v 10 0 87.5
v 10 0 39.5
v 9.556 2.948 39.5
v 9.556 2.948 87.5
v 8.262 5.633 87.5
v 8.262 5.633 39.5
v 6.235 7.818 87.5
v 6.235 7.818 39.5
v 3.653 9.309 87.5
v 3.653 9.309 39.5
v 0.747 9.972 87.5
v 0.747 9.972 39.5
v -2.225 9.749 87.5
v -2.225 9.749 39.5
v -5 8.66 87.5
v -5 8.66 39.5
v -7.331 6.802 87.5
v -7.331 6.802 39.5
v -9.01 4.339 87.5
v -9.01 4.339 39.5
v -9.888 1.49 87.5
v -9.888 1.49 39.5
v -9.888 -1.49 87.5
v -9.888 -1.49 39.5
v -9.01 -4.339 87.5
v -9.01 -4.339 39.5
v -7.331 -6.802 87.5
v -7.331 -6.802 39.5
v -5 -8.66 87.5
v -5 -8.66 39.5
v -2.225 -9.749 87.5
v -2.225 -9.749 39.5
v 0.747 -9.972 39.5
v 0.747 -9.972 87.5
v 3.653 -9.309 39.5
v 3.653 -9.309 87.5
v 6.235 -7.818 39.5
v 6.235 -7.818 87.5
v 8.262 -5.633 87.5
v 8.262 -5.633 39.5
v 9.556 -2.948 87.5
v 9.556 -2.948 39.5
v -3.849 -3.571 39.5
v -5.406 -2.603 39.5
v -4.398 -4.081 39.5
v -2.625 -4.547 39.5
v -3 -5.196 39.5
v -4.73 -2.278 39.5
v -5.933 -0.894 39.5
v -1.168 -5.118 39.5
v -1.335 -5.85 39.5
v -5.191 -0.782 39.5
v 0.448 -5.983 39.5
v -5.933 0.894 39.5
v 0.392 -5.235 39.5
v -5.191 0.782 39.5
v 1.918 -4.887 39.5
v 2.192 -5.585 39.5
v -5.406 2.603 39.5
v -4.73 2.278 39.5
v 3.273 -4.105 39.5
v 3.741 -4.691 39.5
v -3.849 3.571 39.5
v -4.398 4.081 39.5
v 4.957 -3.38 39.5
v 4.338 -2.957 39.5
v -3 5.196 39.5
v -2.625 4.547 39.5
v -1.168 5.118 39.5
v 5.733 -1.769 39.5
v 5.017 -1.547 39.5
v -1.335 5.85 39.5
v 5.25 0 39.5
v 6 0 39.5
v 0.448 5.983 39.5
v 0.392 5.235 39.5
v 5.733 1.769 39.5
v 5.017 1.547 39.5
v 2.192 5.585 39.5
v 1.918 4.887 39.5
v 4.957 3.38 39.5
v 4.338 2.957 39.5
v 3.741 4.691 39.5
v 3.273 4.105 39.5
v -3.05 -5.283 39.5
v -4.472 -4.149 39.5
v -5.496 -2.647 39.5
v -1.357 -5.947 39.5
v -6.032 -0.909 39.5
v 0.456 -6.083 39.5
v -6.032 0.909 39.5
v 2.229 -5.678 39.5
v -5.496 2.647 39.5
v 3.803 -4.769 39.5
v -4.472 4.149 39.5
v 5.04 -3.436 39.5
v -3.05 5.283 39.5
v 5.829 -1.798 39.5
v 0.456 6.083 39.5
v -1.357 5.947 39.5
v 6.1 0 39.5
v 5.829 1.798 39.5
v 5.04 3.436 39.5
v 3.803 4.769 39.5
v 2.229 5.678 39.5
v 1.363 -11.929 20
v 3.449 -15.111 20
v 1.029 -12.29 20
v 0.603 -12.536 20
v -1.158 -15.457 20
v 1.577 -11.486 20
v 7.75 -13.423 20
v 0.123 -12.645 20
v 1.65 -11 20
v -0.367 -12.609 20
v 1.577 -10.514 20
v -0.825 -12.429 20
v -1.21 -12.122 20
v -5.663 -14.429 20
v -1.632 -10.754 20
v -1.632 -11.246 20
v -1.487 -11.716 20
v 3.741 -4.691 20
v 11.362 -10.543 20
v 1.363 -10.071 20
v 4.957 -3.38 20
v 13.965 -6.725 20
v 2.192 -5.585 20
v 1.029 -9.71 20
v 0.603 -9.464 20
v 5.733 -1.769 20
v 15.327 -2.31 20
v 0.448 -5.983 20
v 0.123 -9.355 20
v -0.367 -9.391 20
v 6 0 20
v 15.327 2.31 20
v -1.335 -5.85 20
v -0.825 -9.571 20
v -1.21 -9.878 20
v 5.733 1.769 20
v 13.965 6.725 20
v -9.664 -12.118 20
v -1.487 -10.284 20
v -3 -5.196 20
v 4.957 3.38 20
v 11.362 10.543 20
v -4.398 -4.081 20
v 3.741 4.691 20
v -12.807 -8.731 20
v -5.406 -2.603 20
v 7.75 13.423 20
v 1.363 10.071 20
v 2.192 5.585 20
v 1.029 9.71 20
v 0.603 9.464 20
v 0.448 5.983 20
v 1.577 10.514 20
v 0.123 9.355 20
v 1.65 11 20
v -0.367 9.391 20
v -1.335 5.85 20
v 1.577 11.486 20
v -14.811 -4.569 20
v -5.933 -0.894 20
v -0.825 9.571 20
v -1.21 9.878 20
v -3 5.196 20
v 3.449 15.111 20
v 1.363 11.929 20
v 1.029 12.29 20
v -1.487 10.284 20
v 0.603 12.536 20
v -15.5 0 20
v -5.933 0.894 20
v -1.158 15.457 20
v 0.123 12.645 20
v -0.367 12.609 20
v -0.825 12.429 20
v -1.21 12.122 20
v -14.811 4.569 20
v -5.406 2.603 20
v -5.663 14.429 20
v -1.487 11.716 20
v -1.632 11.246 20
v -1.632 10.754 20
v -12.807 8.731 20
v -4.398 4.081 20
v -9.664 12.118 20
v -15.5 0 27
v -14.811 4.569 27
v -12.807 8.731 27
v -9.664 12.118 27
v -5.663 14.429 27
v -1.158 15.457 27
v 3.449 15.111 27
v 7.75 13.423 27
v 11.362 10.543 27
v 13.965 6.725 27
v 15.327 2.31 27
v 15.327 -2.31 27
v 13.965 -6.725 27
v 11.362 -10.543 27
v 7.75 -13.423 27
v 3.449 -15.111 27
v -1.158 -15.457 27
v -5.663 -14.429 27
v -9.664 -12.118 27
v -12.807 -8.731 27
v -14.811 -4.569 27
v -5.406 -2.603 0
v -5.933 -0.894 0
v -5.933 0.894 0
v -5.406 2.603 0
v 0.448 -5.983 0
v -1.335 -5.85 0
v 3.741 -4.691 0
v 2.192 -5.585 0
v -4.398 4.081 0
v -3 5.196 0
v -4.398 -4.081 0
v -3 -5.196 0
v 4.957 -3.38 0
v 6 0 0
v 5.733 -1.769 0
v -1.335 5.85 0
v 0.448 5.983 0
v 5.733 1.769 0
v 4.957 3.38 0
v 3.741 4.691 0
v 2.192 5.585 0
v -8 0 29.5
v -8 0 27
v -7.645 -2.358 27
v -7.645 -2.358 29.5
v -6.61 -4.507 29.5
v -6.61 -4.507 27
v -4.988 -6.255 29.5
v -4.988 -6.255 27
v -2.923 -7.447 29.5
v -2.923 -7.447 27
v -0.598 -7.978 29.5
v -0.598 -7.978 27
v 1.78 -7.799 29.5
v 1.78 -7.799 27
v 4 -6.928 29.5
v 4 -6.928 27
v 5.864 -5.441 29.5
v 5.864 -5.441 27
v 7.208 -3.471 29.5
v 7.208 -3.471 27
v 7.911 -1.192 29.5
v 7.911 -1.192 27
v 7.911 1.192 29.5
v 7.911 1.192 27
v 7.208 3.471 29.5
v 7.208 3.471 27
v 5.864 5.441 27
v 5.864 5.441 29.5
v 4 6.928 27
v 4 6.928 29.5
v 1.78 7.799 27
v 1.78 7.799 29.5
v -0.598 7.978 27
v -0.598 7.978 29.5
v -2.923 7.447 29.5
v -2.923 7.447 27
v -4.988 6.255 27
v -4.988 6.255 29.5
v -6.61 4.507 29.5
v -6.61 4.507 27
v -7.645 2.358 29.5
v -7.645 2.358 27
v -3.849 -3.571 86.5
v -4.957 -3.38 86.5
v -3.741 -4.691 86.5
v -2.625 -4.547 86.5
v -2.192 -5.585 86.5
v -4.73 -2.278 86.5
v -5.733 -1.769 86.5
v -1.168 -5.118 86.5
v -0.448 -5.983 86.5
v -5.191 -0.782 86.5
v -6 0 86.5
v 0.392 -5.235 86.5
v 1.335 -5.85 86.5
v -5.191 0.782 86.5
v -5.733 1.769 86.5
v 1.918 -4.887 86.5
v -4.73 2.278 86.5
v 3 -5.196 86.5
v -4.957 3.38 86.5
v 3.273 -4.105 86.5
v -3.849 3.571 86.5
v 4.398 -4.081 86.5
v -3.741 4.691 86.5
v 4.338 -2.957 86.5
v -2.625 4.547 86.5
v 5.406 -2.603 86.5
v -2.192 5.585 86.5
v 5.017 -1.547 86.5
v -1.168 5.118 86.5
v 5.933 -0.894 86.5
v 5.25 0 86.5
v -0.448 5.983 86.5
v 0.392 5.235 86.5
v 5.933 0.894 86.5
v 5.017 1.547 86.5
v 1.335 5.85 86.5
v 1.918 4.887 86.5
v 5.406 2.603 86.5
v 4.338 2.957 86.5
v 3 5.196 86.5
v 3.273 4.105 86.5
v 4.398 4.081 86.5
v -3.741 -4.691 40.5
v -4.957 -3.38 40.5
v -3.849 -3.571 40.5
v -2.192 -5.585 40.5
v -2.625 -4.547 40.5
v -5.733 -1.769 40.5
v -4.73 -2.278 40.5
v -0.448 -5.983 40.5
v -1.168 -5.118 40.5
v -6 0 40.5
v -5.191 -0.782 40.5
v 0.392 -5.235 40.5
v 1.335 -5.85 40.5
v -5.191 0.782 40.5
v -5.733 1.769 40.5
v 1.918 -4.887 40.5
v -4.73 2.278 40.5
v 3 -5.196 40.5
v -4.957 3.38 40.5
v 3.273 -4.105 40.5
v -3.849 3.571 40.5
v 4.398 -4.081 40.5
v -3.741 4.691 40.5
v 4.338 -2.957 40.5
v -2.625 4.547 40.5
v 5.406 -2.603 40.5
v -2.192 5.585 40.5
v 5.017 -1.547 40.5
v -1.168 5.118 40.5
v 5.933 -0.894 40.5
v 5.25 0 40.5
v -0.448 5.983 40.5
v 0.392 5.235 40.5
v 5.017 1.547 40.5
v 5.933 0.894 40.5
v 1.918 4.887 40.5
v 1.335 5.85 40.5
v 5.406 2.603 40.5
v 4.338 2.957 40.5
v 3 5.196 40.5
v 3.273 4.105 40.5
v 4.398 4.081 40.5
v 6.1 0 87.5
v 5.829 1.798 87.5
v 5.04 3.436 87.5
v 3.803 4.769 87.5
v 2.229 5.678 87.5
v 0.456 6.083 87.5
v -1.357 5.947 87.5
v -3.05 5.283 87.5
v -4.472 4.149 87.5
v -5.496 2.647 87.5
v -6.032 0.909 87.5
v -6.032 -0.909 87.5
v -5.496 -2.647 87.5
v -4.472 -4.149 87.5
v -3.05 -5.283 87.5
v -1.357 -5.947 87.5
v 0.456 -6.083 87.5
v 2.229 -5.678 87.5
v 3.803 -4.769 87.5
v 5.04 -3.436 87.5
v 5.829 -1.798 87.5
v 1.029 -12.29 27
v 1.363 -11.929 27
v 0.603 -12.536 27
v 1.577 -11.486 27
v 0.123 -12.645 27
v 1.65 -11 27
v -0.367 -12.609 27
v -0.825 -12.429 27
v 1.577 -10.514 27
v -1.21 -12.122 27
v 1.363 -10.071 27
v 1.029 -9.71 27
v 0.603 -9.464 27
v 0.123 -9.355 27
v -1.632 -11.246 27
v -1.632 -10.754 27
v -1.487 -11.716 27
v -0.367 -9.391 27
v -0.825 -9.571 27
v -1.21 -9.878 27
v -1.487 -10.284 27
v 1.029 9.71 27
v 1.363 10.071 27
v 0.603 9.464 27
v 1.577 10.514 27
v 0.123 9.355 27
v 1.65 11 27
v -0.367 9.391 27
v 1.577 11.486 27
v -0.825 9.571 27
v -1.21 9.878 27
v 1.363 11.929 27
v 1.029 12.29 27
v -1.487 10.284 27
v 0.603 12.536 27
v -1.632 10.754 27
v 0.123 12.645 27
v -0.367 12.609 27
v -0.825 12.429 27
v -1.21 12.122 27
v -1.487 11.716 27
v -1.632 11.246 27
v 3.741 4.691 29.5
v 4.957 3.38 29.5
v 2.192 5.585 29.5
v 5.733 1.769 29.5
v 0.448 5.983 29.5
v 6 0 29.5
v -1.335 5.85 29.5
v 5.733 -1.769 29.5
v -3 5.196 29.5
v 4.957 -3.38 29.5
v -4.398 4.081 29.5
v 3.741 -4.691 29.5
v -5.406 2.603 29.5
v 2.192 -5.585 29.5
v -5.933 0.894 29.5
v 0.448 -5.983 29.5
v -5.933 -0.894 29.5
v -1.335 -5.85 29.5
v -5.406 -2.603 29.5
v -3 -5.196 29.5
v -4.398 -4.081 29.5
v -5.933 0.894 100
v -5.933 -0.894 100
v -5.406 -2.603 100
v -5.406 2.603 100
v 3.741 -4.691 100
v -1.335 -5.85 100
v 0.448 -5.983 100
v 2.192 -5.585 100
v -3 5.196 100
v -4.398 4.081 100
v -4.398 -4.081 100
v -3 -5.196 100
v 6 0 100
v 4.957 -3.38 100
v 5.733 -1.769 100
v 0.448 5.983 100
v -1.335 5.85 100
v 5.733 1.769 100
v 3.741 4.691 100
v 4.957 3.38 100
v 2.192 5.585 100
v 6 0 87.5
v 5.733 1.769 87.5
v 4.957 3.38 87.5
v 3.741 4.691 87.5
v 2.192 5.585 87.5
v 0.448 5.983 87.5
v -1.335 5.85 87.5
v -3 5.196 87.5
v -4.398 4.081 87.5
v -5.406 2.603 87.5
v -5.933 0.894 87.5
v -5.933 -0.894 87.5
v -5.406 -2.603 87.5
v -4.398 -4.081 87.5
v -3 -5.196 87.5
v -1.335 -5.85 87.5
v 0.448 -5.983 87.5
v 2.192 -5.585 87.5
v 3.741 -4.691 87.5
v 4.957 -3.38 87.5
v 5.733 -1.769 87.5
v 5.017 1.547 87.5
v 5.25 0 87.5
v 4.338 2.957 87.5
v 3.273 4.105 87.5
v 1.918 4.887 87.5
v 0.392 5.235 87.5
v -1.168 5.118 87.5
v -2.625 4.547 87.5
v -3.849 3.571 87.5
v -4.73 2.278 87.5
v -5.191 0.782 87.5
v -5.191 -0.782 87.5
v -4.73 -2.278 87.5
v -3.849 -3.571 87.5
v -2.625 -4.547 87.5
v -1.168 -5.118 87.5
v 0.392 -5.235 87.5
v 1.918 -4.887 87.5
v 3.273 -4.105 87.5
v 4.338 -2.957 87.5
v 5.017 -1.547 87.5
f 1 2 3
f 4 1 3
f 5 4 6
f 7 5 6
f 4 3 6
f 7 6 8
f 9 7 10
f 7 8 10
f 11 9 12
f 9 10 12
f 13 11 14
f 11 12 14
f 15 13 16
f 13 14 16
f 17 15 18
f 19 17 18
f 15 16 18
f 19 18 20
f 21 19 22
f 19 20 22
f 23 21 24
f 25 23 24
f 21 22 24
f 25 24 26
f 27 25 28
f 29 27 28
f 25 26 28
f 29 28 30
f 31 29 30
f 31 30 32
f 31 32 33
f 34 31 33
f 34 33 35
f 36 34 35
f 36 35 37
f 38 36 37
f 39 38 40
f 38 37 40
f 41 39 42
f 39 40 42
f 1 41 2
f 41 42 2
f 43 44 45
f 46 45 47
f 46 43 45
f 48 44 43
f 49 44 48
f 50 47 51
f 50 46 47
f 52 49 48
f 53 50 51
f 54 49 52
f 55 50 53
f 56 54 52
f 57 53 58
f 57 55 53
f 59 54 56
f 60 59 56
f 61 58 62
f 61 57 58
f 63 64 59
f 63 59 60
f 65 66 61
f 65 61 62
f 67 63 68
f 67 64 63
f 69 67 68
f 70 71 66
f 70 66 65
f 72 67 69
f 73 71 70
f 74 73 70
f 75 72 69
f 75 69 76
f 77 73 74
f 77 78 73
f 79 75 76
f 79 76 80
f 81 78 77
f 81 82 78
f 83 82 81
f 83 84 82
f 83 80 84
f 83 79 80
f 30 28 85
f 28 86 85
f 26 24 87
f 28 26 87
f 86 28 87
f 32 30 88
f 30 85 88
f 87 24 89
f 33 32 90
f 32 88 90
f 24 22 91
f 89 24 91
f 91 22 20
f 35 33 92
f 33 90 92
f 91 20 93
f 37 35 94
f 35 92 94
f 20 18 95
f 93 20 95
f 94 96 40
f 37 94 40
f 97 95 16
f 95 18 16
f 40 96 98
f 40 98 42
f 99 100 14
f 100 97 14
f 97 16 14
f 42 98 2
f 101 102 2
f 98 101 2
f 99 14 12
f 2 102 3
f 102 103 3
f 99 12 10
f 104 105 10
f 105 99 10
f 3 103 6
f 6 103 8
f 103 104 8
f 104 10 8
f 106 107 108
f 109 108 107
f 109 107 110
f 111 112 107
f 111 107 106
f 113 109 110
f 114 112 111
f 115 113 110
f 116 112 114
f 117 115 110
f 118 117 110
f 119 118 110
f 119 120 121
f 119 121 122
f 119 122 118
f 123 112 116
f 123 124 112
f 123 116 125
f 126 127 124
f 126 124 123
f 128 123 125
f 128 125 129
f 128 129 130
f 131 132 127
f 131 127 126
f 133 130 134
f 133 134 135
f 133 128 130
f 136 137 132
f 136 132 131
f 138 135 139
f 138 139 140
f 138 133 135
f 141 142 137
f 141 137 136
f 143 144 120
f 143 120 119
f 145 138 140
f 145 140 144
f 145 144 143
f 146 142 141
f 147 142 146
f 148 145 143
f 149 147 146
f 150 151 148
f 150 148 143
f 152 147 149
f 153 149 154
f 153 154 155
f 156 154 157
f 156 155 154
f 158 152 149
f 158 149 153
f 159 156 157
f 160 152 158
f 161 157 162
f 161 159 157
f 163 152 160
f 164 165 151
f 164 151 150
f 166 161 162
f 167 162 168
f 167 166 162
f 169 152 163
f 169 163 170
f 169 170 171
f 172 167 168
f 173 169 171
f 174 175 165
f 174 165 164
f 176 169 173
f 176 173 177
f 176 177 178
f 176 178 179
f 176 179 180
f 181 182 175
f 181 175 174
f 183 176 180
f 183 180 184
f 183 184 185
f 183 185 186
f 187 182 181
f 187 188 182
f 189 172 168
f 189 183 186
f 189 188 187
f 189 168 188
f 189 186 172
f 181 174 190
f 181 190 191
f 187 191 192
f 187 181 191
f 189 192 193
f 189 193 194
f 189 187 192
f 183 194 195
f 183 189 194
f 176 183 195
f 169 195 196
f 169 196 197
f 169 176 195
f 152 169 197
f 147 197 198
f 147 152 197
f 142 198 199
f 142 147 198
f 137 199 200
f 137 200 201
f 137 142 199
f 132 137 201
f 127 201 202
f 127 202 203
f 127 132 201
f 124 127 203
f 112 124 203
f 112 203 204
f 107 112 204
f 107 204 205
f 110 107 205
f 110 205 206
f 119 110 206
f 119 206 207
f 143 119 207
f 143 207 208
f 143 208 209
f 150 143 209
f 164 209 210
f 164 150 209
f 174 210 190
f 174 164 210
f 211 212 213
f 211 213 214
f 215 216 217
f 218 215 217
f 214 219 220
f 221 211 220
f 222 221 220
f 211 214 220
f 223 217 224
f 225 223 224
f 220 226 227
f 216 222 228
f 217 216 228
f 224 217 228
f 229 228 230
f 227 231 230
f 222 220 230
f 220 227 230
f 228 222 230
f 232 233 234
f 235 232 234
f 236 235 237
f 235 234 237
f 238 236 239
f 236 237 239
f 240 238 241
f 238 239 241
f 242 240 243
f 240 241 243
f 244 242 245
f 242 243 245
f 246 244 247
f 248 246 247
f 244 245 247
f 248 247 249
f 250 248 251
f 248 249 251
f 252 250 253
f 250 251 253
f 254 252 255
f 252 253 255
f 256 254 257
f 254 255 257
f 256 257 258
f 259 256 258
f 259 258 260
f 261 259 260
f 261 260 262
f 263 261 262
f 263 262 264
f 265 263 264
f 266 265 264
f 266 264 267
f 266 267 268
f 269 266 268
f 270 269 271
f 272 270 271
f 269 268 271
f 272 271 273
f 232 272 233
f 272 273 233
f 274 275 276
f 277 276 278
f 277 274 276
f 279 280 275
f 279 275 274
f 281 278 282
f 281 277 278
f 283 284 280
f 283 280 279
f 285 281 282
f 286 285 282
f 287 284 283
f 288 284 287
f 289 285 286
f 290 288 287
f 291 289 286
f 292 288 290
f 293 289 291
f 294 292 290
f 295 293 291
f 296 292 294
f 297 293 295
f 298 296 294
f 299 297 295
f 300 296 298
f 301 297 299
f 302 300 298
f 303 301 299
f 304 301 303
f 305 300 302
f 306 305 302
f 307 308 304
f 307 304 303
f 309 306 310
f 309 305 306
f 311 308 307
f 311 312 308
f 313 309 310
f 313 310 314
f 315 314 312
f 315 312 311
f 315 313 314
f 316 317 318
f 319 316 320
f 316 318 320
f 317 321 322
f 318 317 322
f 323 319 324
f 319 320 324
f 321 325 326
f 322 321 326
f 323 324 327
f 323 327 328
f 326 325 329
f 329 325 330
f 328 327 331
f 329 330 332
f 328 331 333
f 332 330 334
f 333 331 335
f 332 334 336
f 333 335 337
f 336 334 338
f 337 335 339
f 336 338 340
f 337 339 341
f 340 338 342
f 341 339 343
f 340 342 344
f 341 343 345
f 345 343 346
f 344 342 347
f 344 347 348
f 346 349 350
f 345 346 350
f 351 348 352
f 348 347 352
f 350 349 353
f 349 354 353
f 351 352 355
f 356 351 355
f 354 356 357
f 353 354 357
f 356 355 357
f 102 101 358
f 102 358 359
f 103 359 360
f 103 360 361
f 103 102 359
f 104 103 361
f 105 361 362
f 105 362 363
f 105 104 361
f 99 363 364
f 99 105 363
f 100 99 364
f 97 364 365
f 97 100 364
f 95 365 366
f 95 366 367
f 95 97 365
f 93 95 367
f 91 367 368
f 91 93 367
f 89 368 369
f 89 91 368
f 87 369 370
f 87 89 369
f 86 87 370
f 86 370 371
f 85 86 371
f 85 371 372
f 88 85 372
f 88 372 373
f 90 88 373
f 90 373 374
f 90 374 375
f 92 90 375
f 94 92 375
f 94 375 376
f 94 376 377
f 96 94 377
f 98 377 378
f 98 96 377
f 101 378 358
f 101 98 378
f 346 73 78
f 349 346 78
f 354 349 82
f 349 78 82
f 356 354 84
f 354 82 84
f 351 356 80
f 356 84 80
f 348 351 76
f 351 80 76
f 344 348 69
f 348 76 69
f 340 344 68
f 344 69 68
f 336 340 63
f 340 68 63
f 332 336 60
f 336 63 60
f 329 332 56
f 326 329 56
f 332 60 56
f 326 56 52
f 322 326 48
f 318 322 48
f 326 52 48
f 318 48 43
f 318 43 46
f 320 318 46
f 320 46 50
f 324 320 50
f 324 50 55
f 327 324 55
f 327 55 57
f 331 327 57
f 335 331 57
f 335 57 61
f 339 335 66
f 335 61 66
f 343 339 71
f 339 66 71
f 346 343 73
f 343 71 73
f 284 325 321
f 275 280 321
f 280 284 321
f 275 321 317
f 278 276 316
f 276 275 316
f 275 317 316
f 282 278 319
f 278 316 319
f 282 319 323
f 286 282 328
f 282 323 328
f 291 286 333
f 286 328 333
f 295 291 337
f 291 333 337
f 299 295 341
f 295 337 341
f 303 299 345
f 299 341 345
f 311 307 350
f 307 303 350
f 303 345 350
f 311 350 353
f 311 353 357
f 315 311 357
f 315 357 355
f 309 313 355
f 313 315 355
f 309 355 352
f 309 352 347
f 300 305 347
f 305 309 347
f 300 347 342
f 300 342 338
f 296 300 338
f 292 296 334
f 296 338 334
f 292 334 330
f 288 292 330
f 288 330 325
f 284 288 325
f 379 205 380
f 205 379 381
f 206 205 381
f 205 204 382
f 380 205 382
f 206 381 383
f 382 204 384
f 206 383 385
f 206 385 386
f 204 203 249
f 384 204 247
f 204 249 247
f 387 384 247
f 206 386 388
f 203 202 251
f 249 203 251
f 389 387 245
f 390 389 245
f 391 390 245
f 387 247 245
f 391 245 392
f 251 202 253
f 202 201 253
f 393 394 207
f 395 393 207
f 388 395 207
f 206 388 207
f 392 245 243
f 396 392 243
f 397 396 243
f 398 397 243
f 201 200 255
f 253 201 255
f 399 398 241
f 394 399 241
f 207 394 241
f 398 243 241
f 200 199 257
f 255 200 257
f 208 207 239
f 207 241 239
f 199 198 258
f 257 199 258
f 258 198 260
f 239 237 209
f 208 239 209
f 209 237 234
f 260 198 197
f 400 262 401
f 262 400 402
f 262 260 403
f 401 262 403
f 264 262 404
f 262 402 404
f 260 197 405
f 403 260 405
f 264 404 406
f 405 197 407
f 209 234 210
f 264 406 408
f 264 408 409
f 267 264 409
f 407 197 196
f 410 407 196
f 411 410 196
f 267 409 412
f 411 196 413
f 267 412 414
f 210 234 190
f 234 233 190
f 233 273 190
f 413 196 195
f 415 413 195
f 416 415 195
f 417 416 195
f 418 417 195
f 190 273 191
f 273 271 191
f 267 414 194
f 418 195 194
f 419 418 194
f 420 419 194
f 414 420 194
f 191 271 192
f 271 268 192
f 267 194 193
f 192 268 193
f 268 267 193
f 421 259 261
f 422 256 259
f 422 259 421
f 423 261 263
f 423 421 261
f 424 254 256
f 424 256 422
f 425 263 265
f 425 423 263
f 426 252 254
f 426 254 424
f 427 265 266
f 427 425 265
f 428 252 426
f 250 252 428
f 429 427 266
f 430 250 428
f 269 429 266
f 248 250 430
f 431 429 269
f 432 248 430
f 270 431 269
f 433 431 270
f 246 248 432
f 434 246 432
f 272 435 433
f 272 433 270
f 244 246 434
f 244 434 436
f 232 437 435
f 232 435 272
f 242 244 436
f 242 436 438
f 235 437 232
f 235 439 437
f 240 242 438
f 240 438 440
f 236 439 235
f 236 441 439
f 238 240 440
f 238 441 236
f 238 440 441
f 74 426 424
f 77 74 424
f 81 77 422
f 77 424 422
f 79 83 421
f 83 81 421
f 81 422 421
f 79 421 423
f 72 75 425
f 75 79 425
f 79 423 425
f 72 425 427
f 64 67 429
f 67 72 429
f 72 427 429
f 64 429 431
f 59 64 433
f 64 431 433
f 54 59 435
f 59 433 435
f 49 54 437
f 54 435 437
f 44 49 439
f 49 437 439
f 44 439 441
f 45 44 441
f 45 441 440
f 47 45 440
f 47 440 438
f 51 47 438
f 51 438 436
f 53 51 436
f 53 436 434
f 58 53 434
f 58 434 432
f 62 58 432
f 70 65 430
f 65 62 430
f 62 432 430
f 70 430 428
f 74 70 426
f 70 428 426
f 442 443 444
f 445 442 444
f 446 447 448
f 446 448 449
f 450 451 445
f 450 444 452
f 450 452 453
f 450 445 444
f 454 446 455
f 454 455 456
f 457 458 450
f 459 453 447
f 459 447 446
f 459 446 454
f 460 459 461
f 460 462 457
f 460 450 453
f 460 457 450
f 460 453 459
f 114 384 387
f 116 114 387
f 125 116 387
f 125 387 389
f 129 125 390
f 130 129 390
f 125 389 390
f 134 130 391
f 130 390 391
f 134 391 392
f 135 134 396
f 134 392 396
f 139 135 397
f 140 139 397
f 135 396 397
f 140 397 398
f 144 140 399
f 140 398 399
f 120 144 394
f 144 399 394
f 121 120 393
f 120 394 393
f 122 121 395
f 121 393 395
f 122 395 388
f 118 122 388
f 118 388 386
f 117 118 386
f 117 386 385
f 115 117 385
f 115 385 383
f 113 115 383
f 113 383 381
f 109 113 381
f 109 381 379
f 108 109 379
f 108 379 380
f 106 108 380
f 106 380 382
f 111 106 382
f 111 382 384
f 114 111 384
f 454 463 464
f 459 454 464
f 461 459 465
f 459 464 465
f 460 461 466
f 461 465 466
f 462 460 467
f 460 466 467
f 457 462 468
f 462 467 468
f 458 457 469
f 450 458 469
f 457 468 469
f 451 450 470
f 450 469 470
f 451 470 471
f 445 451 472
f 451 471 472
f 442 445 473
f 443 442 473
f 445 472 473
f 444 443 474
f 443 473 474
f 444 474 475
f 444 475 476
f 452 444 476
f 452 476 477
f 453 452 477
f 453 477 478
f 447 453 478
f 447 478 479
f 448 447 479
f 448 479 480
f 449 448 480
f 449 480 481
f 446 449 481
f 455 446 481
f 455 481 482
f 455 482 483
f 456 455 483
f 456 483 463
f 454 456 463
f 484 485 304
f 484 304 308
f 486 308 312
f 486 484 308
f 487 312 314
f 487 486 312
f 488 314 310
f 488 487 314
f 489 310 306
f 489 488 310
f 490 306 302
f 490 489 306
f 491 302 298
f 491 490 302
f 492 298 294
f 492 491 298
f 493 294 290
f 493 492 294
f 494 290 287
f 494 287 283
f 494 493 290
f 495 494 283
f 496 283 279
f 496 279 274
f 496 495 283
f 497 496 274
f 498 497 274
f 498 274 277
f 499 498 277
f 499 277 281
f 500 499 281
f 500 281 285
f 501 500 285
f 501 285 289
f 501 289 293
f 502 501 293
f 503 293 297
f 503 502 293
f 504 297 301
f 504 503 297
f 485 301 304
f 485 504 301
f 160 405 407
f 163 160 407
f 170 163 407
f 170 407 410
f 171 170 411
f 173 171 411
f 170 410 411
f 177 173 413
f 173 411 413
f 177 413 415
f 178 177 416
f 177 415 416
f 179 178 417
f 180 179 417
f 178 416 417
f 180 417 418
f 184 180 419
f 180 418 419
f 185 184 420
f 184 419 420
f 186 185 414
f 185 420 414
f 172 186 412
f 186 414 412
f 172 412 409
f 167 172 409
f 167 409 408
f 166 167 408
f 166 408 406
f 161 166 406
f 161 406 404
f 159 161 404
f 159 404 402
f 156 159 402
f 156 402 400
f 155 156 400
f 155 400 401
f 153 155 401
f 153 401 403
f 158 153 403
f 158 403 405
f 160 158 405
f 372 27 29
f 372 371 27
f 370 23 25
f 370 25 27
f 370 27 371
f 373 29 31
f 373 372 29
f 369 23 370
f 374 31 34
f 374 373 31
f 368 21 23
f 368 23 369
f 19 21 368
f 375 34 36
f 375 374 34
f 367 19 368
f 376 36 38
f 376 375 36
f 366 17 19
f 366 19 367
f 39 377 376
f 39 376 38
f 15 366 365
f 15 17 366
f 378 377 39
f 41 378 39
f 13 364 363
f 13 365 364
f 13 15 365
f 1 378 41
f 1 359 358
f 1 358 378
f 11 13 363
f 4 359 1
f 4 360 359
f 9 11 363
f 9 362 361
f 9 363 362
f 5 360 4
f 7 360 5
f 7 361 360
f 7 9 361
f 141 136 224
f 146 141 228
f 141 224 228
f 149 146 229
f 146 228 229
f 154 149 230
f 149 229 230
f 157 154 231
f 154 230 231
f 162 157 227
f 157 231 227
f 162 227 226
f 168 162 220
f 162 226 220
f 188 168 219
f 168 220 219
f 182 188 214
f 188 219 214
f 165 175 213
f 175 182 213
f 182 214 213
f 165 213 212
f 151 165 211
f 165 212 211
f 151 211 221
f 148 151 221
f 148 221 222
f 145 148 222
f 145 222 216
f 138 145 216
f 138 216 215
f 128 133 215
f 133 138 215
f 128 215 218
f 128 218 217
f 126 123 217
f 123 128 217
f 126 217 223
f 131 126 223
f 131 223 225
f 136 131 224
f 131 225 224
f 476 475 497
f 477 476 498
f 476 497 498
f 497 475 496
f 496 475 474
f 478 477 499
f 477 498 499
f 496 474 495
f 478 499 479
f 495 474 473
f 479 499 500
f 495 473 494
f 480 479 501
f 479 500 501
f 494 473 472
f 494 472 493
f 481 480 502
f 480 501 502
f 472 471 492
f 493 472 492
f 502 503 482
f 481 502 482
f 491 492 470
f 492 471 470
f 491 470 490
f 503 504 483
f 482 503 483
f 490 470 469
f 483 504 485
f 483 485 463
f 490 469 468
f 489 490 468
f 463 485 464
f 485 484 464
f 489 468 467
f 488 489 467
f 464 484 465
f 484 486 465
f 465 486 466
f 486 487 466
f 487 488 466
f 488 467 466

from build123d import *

# Parameters (mm, degrees)
SKETCH1_R           = 6
BOSS_EXTRUDE1_DEPTH = 100
SKETCH2_R           = 15.5
BOSS_EXTRUDE2_DEPTH = 7
SKETCH3_R           = 8
BOSS_EXTRUDE3_DEPTH = 2.5
SKETCH4_R           = 10
BOSS_EXTRUDE4_DEPTH = 48
SKETCH5_R           = 1.65
CUT_EXTRUDE1_DEPTH  = 48
CUT_EXTRUDE2_START  = -48
SKETCH6_R           = 6.1
SKETCH6_R_2         = 6
CUT_EXTRUDE2_DEPTH  = 48
SKETCH7_R           = 6
SKETCH7_R_2         = 5.25
CUT_EXTRUDE3_DEPTH  = 1
SKETCH8_R           = 6
SKETCH8_R_2         = 5.25
CUT_EXTRUDE4_DEPTH  = 1


with BuildPart() as part:
    # Sketch1 → Boss-Extrude1 (new body)
    with BuildSketch(Plane.XY):
        Circle(SKETCH1_R)
    extrude(amount=BOSS_EXTRUDE1_DEPTH)

    # Sketch2 → Boss-Extrude2 (add)
    with BuildSketch(Plane(origin=(0, 0, 20), x_dir=(-1, 0, 0), z_dir=(0, 0, -1))):
        Circle(SKETCH2_R)
    extrude(amount=-BOSS_EXTRUDE2_DEPTH)

    # Sketch3 → Boss-Extrude3 (add)
    with BuildSketch(Plane.XY.offset(27)):
        with Locations(Location((0, 0, 0), (0, 0, 180))):
            Circle(SKETCH3_R)
    extrude(amount=BOSS_EXTRUDE3_DEPTH)

    # Sketch4 → Boss-Extrude4 (add)
    with BuildSketch(Plane.XY.offset(39.5)):
        Circle(SKETCH4_R)
    extrude(amount=BOSS_EXTRUDE4_DEPTH)

    # Sketch5 → Cut-Extrude1 (cut)
    with BuildSketch(Plane.XY.offset(27)):
        with Locations((0, 11)):
            Circle(SKETCH5_R)
        with Locations((0, -11)):
            Circle(SKETCH5_R)
    extrude(amount=-CUT_EXTRUDE1_DEPTH, mode=Mode.SUBTRACT)

    # Sketch6 → Cut-Extrude2 (cut)
    with BuildSketch(Plane.XY.offset(87.5).offset(CUT_EXTRUDE2_START)):
        Circle(SKETCH6_R)
        with Locations(Location((0, 0, 0), (0, 0, 180))):
            Circle(SKETCH6_R_2, mode=Mode.SUBTRACT)
    extrude(amount=CUT_EXTRUDE2_DEPTH, mode=Mode.SUBTRACT)


with BuildPart() as cut_extrude2_piece_1:
    # of the separate pieces the step leaves, piece 1, a body of its own (cut_extrude2_pieces)
    add(part.part.solids().sort_by_distance((6, 0, 0))[0])

    # Sketch7 → Cut-Extrude3 (cut)
    with BuildSketch(Plane.XY.offset(39.5)):
        Circle(SKETCH7_R)
        Circle(SKETCH7_R_2, mode=Mode.SUBTRACT)
    extrude(amount=CUT_EXTRUDE3_DEPTH, mode=Mode.SUBTRACT)

    # Sketch8 → Cut-Extrude4 (cut)
    with BuildSketch(Plane.XY.offset(87.5)):
        Circle(SKETCH8_R)
        Circle(SKETCH8_R_2, mode=Mode.SUBTRACT)
    extrude(amount=-CUT_EXTRUDE4_DEPTH, mode=Mode.SUBTRACT)


with BuildPart() as cut_extrude2_piece_2:
    # of the separate pieces the step leaves, piece 2, a body of its own (cut_extrude2_pieces)
    add(part.part.solids().sort_by_distance((10, 0, 39.5))[0])


solid = Compound([cut_extrude2_piece_1.part, cut_extrude2_piece_2.part])
